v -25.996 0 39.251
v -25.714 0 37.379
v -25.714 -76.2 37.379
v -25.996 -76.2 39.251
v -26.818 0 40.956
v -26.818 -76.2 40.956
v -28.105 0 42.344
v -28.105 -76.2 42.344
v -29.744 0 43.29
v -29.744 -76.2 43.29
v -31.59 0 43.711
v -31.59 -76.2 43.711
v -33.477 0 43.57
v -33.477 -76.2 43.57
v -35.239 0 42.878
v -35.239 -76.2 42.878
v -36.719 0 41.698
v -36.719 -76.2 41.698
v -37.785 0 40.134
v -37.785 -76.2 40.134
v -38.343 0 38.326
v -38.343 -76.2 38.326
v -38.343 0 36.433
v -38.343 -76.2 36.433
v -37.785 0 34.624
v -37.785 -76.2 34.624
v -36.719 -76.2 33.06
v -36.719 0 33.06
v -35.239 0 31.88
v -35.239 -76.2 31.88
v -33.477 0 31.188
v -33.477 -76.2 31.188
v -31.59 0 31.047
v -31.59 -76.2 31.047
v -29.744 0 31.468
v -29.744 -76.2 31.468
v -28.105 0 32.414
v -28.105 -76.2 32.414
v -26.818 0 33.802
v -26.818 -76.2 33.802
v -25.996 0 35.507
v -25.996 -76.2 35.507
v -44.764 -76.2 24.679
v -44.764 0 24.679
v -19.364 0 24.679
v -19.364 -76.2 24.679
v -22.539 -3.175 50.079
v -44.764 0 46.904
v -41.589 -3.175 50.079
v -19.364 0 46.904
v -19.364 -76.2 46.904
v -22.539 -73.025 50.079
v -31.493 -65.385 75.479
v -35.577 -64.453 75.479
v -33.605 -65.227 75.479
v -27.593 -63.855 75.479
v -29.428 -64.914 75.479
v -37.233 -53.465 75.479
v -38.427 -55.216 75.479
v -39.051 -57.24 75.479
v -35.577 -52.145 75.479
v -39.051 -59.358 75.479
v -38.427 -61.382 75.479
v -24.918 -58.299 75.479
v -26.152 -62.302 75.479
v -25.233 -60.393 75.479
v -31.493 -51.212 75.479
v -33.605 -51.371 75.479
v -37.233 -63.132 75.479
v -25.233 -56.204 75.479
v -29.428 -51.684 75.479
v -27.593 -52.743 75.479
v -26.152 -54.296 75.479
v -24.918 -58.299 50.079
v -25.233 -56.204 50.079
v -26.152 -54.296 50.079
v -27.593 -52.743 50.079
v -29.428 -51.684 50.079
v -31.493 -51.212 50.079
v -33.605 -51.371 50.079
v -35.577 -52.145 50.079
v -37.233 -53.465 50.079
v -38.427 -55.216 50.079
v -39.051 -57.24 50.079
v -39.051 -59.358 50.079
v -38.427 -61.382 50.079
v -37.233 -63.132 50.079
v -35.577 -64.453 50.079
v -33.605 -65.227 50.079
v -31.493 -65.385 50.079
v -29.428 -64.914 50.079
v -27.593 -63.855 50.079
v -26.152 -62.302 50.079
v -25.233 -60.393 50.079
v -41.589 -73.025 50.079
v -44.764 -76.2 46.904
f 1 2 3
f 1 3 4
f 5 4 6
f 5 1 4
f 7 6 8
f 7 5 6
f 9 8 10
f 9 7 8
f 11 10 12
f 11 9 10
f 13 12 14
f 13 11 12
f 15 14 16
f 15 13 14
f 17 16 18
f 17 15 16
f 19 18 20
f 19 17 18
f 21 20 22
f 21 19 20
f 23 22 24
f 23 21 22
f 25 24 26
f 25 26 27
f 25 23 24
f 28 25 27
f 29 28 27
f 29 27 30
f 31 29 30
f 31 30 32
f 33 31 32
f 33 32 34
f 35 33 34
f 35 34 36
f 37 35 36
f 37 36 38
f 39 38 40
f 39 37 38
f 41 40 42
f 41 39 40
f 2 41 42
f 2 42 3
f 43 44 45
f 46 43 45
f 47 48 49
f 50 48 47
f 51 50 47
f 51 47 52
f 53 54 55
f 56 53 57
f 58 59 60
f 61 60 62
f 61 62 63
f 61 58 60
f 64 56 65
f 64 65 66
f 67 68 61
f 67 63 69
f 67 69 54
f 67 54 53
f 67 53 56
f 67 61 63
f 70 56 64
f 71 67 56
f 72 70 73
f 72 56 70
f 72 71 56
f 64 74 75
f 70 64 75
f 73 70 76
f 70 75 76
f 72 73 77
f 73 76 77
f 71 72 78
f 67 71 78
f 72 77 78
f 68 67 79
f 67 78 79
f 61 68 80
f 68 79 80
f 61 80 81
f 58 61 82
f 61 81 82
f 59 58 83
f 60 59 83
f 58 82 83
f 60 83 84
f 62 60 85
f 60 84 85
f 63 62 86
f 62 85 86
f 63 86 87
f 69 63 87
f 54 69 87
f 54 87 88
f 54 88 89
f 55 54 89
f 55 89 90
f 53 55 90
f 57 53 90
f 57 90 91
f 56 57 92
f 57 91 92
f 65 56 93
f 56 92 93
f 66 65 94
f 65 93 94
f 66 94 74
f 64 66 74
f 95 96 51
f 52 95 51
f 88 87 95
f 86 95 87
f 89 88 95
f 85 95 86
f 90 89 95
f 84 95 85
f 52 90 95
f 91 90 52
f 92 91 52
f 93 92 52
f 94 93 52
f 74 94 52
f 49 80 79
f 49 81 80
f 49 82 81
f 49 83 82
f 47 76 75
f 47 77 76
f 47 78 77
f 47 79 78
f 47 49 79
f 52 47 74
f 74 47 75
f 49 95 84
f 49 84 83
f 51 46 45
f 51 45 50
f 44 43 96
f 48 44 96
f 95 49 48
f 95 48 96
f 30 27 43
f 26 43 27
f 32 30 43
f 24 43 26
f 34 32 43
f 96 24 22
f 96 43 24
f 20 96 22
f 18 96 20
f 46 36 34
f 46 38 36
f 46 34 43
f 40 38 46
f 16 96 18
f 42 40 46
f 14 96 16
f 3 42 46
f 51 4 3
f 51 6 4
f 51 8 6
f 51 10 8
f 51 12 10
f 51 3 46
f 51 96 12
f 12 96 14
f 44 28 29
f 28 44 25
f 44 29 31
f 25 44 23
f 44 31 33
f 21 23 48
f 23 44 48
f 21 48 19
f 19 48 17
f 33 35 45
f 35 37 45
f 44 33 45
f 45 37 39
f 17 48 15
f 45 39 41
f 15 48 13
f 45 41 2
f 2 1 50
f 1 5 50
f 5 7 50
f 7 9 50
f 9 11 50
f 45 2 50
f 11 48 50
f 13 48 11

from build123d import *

# Parameters (mm, degrees)
F0_W     = 25.4
F0_H     = 25.4
F0_R     = 6.35
F1_DEPTH = 76.2
F2_R     = 7.106299
F3_DEPTH = 25.4
F4_SIZE  = 3.175


with BuildPart() as f1:
    # F0 (on Front) → F1 (new body)
    with BuildSketch(Plane.XZ):
        with Locations((-32.064135, 37.379126)):
            Rectangle(F0_W, F0_H)
        with Locations((-32.064135, 37.379126)):
            Circle(F0_R, mode=Mode.SUBTRACT)
    extrude(amount=F1_DEPTH)

    # F2 (on face) → F3 (join)
    with BuildSketch(Plane.XY.offset(50.079126)):
        with Locations((-32.023989, -58.298852)):
            Circle(F2_R)
    extrude(amount=F3_DEPTH)

    # F4
    f4_edges = [f1.edges().sort_by_distance(p)[0] for p in [
        (-19.364135, -38.1, 50.079126),
        (-32.064135, -76.2, 50.079126),
        (-44.764135, -38.1, 50.079126),
        (-32.064135, 0, 50.079126),
    ]]
    chamfer(f4_edges, length=F4_SIZE)


solid = f1.part
